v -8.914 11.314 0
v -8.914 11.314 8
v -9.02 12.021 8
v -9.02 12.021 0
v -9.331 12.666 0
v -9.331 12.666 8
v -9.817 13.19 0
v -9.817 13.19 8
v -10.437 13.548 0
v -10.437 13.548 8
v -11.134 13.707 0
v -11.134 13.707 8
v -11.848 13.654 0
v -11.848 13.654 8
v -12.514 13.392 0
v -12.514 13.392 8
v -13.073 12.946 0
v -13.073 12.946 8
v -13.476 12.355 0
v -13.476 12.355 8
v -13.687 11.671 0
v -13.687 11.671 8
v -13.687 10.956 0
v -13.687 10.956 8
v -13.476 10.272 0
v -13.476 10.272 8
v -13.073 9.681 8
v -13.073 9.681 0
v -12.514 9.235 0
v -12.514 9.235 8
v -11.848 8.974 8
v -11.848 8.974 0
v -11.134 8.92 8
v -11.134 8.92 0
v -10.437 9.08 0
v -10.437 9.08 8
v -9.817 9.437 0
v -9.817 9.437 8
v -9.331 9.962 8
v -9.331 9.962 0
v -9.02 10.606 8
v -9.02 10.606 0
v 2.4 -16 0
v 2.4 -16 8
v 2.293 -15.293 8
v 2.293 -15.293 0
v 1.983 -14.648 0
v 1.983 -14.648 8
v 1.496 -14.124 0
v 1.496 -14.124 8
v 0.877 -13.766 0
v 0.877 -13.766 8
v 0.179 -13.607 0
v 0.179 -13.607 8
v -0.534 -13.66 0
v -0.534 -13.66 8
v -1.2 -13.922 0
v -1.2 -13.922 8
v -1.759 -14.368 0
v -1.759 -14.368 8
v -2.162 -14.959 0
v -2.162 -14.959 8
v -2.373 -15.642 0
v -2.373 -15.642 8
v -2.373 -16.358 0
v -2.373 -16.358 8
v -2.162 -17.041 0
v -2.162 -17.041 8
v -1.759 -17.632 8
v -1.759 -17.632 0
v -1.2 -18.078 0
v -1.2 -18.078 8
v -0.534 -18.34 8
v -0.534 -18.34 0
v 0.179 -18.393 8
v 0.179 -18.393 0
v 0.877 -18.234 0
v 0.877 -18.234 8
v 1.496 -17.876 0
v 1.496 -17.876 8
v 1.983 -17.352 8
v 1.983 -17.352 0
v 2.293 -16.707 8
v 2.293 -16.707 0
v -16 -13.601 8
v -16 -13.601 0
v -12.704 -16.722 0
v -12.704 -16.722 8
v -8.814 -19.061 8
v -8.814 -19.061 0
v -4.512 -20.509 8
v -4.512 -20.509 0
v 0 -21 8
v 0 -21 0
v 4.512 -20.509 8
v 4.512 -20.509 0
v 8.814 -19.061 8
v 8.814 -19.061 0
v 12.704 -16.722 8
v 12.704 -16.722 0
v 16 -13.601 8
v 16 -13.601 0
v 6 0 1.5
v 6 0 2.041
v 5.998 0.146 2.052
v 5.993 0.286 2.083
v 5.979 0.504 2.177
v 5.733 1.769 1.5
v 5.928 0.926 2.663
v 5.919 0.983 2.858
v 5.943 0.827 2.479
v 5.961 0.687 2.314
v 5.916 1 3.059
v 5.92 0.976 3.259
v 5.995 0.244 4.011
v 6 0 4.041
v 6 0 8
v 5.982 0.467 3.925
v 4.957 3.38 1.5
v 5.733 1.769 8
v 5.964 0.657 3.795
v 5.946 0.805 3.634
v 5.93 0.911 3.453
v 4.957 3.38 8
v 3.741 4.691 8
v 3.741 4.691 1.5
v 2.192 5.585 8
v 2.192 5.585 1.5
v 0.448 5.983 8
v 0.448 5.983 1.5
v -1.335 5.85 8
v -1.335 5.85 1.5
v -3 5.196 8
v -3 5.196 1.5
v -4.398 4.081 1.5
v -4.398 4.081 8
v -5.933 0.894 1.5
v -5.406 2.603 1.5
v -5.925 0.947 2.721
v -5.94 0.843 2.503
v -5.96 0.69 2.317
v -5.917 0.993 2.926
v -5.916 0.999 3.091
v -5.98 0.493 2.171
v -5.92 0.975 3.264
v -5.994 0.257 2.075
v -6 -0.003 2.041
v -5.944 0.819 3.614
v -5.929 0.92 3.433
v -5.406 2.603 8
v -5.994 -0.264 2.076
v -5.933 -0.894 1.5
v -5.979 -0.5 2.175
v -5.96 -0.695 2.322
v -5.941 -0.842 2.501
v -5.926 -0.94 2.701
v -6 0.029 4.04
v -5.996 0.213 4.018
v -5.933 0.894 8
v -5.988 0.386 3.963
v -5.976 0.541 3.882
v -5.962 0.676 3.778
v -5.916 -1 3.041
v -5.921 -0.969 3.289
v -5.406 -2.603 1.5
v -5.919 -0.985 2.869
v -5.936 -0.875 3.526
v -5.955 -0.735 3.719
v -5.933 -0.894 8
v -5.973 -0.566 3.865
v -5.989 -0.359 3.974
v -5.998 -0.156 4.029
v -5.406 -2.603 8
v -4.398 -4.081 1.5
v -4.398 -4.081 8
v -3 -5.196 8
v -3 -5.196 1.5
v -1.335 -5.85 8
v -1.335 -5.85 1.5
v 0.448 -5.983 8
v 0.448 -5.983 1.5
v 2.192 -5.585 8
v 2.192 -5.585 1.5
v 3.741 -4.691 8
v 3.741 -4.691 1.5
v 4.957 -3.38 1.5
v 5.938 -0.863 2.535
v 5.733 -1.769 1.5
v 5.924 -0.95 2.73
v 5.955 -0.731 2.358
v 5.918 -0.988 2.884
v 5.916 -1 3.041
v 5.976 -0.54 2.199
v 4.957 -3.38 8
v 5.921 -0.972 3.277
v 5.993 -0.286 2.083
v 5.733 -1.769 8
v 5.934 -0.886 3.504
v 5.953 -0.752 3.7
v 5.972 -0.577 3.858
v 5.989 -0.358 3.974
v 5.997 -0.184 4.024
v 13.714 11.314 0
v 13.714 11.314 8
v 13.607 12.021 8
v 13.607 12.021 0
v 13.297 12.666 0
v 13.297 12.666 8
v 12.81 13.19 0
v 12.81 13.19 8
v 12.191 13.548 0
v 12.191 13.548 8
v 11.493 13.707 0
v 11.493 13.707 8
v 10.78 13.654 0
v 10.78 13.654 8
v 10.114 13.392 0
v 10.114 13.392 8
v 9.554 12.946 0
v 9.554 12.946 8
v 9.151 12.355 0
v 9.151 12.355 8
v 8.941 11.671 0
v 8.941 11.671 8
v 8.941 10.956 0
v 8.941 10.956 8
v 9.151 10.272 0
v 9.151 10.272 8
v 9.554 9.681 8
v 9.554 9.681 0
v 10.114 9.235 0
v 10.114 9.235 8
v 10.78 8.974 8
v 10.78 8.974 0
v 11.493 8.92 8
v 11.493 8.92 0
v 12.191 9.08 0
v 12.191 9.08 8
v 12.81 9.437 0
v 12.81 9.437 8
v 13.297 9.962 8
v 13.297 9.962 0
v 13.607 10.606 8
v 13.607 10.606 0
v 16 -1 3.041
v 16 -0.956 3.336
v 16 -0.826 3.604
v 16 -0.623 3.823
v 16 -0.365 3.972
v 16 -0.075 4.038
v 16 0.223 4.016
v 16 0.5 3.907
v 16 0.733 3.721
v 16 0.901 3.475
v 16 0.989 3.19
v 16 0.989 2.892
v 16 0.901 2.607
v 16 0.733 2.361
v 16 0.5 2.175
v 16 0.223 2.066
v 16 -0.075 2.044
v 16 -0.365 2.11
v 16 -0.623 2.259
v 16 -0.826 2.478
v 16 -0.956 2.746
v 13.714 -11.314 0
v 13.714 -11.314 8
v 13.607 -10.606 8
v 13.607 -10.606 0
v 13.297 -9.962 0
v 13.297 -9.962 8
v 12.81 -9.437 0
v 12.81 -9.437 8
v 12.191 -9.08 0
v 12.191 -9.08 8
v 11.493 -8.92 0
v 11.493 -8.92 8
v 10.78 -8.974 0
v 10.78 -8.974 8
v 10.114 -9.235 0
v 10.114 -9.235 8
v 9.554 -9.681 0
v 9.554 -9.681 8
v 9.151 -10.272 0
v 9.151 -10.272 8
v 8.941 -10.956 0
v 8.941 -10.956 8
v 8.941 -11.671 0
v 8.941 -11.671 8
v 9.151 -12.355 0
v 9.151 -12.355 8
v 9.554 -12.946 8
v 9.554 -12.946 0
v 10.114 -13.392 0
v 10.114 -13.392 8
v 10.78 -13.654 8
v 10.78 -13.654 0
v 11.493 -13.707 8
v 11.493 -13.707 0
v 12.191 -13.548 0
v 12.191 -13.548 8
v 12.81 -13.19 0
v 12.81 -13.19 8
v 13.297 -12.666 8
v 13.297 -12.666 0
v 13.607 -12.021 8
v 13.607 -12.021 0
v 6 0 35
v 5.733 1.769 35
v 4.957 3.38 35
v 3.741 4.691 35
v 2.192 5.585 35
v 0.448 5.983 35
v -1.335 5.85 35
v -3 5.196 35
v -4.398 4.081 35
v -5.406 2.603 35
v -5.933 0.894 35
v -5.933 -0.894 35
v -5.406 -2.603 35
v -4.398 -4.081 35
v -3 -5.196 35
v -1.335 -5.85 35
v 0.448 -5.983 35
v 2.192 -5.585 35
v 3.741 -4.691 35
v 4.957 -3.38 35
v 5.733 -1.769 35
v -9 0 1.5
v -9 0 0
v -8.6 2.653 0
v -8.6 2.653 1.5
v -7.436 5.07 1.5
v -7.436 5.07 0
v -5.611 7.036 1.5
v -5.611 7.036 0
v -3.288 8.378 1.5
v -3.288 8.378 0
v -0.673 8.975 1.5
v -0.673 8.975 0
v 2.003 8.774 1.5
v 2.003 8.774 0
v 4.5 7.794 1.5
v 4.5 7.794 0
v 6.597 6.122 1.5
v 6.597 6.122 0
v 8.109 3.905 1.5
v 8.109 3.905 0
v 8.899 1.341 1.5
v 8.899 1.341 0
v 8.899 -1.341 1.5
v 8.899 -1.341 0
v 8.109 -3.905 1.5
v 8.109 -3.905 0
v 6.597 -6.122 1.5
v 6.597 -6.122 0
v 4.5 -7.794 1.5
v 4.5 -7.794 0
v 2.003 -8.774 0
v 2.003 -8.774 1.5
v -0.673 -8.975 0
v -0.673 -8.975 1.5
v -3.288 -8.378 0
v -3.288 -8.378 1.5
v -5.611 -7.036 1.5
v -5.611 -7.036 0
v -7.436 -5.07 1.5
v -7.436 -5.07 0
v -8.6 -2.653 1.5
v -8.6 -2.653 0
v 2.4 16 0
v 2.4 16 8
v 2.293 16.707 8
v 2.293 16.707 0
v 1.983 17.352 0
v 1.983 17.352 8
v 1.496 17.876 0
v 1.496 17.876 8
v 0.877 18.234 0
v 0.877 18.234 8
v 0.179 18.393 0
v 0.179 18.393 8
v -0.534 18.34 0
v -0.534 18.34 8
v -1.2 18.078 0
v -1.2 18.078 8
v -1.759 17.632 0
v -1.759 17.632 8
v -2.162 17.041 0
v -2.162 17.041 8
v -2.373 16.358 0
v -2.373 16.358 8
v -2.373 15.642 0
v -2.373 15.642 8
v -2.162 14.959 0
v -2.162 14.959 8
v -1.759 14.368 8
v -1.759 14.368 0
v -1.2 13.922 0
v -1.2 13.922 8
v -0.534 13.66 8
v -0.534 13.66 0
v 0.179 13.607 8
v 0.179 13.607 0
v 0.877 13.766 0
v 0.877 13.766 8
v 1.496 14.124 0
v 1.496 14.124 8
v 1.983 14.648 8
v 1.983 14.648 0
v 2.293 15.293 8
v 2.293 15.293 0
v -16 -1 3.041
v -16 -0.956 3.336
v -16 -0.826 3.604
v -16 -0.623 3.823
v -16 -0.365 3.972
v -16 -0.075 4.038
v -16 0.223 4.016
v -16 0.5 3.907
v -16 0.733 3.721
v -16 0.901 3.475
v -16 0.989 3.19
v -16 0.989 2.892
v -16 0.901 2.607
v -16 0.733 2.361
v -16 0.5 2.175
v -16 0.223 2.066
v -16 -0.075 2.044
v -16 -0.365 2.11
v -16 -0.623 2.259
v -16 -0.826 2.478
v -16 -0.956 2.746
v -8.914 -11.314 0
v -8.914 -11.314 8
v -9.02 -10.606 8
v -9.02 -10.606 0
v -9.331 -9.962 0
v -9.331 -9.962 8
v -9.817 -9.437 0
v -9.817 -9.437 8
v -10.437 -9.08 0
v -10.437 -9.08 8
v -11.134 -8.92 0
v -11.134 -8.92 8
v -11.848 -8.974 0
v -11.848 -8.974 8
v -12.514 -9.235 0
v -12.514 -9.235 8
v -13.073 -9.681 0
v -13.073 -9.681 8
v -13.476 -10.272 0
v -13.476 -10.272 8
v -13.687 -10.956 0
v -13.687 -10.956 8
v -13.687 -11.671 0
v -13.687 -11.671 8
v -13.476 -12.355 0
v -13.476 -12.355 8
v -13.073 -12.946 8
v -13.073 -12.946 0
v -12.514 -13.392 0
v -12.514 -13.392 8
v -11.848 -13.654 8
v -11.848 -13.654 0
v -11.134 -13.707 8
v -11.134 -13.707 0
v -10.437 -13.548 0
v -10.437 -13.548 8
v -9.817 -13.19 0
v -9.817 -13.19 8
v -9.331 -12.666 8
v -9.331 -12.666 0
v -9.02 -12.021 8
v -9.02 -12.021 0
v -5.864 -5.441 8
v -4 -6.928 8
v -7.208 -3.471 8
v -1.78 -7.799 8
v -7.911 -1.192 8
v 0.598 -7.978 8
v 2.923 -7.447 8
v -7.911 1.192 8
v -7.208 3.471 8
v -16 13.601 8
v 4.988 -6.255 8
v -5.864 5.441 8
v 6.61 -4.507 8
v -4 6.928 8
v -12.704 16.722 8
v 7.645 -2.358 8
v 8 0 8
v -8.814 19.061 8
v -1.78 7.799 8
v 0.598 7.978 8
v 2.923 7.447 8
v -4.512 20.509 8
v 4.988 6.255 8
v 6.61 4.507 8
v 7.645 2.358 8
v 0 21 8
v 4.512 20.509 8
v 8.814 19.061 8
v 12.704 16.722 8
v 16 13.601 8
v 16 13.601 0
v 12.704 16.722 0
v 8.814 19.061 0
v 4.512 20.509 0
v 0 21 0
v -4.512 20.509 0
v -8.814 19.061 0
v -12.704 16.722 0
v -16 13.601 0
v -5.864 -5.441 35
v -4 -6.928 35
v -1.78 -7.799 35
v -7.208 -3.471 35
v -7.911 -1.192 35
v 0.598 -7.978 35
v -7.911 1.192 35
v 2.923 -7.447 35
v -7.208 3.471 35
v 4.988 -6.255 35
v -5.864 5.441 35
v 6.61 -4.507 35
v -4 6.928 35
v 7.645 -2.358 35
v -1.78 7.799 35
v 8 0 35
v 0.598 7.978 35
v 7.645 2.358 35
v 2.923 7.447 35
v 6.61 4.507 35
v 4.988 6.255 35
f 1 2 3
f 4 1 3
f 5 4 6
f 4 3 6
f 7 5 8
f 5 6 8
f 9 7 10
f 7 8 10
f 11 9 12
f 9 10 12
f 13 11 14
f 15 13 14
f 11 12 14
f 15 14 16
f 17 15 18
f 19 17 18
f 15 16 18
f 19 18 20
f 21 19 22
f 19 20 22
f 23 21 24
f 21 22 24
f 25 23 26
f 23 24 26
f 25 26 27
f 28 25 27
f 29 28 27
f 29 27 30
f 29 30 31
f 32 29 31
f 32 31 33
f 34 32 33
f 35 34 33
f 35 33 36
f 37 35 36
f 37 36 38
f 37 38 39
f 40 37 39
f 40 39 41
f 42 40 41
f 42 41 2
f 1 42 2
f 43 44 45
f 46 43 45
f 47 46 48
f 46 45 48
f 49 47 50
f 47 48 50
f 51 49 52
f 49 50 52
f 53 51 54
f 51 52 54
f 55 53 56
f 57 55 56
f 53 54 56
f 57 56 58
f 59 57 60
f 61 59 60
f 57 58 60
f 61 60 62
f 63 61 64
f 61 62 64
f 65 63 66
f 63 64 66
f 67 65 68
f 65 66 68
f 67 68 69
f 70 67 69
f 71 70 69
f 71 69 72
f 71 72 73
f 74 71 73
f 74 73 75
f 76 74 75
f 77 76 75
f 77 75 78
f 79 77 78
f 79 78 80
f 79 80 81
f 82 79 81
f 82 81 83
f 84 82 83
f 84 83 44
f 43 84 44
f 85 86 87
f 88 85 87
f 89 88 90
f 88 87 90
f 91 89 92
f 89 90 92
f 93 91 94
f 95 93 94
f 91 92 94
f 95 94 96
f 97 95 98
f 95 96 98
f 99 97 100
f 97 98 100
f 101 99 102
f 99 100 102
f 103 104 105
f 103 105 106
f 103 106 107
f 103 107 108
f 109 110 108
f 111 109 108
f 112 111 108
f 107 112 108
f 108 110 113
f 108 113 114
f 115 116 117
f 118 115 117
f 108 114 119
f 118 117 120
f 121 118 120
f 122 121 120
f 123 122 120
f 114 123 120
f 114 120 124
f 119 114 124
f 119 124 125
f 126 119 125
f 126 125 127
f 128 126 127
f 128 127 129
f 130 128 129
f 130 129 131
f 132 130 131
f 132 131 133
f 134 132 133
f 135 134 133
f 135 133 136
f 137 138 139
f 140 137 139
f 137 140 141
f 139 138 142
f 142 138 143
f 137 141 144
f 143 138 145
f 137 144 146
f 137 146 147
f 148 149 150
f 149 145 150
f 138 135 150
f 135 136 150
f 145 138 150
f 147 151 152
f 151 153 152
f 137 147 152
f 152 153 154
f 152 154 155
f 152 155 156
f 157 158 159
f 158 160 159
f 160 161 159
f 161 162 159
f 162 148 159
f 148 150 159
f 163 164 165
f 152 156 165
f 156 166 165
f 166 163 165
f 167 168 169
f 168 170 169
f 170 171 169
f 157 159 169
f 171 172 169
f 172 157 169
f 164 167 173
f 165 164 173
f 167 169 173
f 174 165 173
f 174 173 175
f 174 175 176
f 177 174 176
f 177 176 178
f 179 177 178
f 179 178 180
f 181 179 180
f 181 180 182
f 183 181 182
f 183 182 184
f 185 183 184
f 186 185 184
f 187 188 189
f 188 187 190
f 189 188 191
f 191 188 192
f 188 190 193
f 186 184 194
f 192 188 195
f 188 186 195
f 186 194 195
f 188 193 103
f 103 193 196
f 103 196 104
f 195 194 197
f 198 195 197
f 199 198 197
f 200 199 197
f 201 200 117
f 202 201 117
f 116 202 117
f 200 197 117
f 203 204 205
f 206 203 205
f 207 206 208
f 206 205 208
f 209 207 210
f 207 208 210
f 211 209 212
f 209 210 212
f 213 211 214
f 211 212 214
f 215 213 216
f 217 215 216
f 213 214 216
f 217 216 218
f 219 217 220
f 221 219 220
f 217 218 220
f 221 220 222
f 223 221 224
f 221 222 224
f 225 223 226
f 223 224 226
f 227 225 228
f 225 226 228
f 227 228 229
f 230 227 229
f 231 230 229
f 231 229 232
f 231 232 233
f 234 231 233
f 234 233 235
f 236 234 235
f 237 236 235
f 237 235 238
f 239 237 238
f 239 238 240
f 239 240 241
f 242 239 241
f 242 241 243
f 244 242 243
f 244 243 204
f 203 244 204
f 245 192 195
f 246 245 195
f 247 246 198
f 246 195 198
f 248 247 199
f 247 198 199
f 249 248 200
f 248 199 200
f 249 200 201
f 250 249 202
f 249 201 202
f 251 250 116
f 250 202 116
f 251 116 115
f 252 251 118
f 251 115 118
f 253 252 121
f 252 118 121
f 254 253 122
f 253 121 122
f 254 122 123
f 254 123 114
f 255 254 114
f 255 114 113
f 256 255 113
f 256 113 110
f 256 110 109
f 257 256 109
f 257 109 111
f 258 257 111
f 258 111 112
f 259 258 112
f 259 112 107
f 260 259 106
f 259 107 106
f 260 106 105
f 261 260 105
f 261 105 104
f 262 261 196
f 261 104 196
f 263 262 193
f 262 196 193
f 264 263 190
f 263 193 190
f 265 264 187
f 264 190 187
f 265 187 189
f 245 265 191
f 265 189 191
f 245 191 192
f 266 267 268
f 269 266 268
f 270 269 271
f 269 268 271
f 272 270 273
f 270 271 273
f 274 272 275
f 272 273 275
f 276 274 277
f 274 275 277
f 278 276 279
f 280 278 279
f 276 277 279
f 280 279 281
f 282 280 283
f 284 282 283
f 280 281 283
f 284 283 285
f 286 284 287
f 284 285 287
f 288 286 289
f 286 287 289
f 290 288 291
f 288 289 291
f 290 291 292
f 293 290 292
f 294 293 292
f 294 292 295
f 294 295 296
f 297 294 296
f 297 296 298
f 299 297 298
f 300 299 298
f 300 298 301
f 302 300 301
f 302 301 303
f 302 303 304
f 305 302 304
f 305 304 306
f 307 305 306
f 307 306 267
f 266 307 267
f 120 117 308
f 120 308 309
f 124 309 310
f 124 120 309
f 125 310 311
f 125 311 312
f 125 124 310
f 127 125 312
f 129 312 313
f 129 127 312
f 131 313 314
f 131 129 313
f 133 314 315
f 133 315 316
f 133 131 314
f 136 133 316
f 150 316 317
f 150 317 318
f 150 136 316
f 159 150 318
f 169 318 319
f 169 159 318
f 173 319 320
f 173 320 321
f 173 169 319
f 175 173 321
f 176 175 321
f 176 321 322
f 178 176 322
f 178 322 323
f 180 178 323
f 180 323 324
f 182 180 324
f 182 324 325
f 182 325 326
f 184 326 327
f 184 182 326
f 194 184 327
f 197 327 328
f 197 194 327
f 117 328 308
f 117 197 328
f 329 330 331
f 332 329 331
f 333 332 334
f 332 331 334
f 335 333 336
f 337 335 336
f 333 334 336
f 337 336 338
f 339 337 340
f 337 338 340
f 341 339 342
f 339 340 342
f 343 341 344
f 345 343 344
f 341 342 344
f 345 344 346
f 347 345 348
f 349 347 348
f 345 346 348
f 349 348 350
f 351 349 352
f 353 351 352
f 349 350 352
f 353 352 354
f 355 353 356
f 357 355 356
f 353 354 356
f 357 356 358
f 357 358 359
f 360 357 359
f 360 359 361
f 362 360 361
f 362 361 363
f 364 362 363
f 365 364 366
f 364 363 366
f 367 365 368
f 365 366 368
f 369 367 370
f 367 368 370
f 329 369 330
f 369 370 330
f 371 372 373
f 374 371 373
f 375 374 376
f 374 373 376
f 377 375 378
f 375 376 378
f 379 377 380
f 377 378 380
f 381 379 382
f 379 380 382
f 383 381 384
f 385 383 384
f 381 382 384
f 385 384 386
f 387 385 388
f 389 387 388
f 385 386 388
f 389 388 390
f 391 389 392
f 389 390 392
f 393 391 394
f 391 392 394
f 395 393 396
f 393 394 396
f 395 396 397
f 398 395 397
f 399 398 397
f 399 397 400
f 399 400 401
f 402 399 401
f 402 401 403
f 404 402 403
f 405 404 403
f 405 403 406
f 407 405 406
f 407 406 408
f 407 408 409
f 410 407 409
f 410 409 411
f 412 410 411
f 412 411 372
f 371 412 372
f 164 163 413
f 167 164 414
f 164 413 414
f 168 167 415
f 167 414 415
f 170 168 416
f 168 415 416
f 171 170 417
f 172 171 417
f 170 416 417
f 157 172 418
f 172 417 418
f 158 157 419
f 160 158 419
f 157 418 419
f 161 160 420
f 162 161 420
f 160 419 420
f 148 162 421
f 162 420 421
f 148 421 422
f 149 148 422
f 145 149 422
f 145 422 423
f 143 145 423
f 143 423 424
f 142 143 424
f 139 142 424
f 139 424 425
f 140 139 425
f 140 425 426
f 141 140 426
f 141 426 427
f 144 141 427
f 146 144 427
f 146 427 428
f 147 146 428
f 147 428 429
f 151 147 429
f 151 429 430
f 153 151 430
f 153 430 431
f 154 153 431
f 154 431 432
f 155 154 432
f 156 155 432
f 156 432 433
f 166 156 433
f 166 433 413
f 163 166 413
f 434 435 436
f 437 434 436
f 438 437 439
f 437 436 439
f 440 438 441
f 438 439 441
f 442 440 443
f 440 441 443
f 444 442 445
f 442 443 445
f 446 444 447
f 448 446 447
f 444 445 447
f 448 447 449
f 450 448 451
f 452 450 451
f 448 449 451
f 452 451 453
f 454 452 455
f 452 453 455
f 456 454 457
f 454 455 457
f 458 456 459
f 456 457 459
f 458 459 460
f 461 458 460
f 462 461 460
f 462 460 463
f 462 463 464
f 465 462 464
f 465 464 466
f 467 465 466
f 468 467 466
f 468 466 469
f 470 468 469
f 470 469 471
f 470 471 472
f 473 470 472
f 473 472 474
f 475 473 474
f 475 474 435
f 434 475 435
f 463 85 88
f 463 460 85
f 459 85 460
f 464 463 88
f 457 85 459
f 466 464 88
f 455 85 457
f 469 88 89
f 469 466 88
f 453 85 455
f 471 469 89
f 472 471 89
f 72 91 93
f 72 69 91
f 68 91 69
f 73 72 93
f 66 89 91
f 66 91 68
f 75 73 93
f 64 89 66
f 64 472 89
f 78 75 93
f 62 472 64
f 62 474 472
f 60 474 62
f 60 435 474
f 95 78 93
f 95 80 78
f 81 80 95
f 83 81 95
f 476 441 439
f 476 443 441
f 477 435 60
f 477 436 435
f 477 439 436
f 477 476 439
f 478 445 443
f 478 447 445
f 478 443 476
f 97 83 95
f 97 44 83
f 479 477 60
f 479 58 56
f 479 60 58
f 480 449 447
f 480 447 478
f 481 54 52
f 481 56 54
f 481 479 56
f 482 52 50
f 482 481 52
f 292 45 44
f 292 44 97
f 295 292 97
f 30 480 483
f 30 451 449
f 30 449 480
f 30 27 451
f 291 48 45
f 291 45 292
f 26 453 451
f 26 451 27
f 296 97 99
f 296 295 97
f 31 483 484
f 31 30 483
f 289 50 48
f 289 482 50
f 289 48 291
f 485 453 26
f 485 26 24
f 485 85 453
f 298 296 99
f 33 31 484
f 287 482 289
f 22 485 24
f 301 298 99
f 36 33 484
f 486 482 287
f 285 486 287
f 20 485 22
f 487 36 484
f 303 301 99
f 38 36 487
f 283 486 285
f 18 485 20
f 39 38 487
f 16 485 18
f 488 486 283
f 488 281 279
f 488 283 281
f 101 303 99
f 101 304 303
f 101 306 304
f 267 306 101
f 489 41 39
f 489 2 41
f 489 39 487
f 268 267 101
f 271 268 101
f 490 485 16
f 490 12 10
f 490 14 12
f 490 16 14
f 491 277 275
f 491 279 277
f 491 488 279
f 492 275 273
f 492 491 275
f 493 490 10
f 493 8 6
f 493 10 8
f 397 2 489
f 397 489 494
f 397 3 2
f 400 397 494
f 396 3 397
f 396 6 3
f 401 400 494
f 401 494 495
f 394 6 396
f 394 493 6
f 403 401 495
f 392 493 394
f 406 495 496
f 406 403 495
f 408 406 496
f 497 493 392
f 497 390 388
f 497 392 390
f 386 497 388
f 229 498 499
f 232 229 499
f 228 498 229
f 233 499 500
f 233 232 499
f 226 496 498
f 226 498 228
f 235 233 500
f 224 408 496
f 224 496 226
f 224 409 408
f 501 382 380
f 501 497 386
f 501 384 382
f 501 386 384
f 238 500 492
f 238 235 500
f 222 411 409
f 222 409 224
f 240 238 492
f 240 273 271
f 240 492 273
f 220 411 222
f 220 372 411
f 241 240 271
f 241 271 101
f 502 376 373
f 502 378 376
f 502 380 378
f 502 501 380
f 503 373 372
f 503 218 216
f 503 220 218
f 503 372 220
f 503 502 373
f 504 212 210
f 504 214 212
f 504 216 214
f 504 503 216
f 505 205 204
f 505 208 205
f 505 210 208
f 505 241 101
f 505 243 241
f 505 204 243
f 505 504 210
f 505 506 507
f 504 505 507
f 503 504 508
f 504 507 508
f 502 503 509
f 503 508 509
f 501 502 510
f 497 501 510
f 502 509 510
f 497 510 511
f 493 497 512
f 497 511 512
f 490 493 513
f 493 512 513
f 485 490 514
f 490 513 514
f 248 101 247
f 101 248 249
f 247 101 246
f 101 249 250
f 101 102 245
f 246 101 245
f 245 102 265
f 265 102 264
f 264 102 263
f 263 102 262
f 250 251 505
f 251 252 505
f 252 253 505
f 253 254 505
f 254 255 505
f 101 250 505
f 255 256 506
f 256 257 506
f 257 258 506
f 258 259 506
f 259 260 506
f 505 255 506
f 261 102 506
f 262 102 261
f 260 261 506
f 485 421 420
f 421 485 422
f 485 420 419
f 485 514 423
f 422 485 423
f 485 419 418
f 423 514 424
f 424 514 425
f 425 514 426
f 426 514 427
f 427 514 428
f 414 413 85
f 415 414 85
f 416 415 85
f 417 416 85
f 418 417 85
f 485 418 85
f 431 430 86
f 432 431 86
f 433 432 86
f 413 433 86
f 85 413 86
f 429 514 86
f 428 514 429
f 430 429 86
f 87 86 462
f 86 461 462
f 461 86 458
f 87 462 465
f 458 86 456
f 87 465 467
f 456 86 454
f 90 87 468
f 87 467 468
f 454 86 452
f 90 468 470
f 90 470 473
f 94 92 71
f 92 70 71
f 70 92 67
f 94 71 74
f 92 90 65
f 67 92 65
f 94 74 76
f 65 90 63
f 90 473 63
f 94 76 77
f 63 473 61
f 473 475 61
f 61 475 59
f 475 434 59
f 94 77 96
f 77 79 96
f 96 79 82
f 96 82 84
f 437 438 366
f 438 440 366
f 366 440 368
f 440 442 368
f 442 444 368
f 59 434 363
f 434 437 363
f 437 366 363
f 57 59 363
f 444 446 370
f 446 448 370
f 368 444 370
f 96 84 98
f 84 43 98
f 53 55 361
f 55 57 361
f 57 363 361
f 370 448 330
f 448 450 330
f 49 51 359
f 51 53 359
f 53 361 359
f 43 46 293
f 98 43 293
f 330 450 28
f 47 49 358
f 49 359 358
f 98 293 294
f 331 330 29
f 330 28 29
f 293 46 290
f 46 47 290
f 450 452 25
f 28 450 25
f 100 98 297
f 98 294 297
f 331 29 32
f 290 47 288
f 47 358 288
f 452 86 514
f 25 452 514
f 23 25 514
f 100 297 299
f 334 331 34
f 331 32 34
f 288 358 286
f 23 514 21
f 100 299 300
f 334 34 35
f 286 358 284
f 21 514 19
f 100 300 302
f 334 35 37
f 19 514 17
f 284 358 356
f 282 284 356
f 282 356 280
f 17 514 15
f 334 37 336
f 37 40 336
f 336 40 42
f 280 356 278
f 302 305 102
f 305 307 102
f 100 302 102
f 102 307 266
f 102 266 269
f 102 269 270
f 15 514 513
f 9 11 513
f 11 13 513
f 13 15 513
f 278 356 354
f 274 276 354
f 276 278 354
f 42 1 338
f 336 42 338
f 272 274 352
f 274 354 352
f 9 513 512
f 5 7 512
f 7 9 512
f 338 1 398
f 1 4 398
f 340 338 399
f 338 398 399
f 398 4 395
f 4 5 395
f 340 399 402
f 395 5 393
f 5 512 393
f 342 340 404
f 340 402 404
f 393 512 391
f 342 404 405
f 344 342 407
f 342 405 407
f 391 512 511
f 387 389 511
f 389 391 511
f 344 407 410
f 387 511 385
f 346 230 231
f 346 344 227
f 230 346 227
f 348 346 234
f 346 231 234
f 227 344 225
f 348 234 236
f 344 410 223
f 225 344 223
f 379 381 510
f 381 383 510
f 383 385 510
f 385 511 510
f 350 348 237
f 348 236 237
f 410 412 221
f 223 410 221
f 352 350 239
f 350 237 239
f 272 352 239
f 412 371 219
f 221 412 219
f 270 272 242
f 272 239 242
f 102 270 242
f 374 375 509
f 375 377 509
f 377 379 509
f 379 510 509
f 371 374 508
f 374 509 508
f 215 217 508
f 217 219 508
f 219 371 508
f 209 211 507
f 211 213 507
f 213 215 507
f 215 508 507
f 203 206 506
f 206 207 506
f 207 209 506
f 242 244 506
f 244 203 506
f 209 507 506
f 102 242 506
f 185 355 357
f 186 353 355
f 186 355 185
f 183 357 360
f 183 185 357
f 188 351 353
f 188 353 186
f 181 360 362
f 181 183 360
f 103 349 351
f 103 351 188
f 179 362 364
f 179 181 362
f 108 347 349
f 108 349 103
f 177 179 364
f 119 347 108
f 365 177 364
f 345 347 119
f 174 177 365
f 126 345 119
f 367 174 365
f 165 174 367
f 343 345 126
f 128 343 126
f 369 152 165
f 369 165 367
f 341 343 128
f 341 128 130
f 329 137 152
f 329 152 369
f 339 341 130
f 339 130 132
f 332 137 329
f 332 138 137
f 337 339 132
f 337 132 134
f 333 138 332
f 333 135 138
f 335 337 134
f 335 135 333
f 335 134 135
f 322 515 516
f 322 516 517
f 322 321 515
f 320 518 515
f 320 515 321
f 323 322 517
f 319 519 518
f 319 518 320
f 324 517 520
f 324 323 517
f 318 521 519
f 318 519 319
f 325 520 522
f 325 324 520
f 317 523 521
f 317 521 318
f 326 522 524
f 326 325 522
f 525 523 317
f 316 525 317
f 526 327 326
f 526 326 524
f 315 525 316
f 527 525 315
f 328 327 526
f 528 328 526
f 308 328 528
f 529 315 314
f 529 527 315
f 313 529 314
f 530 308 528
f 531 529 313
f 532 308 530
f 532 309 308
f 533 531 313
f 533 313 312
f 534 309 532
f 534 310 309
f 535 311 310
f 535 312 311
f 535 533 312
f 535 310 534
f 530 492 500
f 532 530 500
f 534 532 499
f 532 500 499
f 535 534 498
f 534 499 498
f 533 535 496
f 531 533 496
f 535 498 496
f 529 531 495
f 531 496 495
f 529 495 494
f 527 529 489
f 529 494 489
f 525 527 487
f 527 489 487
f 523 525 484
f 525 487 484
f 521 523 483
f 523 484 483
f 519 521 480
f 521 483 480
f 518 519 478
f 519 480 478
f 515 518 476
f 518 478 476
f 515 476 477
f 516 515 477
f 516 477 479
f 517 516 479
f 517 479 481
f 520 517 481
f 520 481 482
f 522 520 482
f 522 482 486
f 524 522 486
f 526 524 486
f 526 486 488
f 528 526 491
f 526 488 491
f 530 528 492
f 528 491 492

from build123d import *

# Parameters (mm, degrees)
EXTRUDE_1_DEPTH     = 8
SKETCH_3_R          = 8
SKETCH_3_R_2        = 6
EXTRUDE_3_DEPTH     = 27
SKETCH_5_R          = 6
CUT_EXTRUDE_1_DEPTH = 38.762415177
SKETCH_6_R          = 2.4
CUT_EXTRUDE_2_DEPTH = 38.762415177
SKETCH_7_R          = 9
CUT_EXTRUDE_3_DEPTH = 1.5
SKETCH_8_R          = 1
CUT_EXTRUDE_4_DEPTH = 52.86520992


with BuildPart() as part:
    # 草图2 → 凸台-拉伸1 (new body)
    with BuildSketch(Plane.XY):
        with BuildLine():
            Line((-16, 13.601470509), (-16, -13.601470509))
            ThreePointArc((-16, -13.601470509), (0, -21), (16, -13.601470509))
            Line((16, -13.601470509), (16, 13.601470509))
            ThreePointArc((16, 13.601470509), (0, 21), (-16, 13.601470509))
        make_face()
    extrude(amount=EXTRUDE_1_DEPTH)

    # 草图3 → 凸台-拉伸3 (add)
    with BuildSketch(Plane.XY.offset(8)):
        Circle(SKETCH_3_R)
        Circle(SKETCH_3_R_2, mode=Mode.SUBTRACT)
    extrude(amount=EXTRUDE_3_DEPTH)

    # 草图5 → 切除-拉伸1 (cut, through all)
    with BuildSketch(Plane.XY.offset(8)):
        Circle(SKETCH_5_R)
    extrude(amount=-CUT_EXTRUDE_1_DEPTH, mode=Mode.SUBTRACT)

    # 草图6 → 切除-拉伸2 (cut, through all)
    with BuildSketch(Plane.XY.offset(8)):
        with Locations((0, 16)):
            Circle(SKETCH_6_R)
        with Locations((11.313708499, 11.313708499)):
            Circle(SKETCH_6_R)
        with Locations((11.313708499, -11.313708499)):
            Circle(SKETCH_6_R)
        with Locations((0, -16)):
            Circle(SKETCH_6_R)
        with Locations((-11.313708499, -11.313708499)):
            Circle(SKETCH_6_R)
        with Locations((-11.313708499, 11.313708499)):
            Circle(SKETCH_6_R)
    extrude(amount=-CUT_EXTRUDE_2_DEPTH, mode=Mode.SUBTRACT)

    # 草图7 → 切除-拉伸3 (cut)
    with BuildSketch(Plane(origin=(0, 0, 0), x_dir=(-1, 0, 0), z_dir=(0, 0, -1))):
        Circle(SKETCH_7_R)
    extrude(amount=-CUT_EXTRUDE_3_DEPTH, mode=Mode.SUBTRACT)

    # 草图8 → 切除-拉伸4 (cut, through all)
    with BuildSketch(Plane.ZY.offset(16)):
        with Locations(Location((3.040852045, 0, 0), (0, 0, 270))):
            Circle(SKETCH_8_R)
    extrude(amount=-CUT_EXTRUDE_4_DEPTH, mode=Mode.SUBTRACT)


solid = part.part
